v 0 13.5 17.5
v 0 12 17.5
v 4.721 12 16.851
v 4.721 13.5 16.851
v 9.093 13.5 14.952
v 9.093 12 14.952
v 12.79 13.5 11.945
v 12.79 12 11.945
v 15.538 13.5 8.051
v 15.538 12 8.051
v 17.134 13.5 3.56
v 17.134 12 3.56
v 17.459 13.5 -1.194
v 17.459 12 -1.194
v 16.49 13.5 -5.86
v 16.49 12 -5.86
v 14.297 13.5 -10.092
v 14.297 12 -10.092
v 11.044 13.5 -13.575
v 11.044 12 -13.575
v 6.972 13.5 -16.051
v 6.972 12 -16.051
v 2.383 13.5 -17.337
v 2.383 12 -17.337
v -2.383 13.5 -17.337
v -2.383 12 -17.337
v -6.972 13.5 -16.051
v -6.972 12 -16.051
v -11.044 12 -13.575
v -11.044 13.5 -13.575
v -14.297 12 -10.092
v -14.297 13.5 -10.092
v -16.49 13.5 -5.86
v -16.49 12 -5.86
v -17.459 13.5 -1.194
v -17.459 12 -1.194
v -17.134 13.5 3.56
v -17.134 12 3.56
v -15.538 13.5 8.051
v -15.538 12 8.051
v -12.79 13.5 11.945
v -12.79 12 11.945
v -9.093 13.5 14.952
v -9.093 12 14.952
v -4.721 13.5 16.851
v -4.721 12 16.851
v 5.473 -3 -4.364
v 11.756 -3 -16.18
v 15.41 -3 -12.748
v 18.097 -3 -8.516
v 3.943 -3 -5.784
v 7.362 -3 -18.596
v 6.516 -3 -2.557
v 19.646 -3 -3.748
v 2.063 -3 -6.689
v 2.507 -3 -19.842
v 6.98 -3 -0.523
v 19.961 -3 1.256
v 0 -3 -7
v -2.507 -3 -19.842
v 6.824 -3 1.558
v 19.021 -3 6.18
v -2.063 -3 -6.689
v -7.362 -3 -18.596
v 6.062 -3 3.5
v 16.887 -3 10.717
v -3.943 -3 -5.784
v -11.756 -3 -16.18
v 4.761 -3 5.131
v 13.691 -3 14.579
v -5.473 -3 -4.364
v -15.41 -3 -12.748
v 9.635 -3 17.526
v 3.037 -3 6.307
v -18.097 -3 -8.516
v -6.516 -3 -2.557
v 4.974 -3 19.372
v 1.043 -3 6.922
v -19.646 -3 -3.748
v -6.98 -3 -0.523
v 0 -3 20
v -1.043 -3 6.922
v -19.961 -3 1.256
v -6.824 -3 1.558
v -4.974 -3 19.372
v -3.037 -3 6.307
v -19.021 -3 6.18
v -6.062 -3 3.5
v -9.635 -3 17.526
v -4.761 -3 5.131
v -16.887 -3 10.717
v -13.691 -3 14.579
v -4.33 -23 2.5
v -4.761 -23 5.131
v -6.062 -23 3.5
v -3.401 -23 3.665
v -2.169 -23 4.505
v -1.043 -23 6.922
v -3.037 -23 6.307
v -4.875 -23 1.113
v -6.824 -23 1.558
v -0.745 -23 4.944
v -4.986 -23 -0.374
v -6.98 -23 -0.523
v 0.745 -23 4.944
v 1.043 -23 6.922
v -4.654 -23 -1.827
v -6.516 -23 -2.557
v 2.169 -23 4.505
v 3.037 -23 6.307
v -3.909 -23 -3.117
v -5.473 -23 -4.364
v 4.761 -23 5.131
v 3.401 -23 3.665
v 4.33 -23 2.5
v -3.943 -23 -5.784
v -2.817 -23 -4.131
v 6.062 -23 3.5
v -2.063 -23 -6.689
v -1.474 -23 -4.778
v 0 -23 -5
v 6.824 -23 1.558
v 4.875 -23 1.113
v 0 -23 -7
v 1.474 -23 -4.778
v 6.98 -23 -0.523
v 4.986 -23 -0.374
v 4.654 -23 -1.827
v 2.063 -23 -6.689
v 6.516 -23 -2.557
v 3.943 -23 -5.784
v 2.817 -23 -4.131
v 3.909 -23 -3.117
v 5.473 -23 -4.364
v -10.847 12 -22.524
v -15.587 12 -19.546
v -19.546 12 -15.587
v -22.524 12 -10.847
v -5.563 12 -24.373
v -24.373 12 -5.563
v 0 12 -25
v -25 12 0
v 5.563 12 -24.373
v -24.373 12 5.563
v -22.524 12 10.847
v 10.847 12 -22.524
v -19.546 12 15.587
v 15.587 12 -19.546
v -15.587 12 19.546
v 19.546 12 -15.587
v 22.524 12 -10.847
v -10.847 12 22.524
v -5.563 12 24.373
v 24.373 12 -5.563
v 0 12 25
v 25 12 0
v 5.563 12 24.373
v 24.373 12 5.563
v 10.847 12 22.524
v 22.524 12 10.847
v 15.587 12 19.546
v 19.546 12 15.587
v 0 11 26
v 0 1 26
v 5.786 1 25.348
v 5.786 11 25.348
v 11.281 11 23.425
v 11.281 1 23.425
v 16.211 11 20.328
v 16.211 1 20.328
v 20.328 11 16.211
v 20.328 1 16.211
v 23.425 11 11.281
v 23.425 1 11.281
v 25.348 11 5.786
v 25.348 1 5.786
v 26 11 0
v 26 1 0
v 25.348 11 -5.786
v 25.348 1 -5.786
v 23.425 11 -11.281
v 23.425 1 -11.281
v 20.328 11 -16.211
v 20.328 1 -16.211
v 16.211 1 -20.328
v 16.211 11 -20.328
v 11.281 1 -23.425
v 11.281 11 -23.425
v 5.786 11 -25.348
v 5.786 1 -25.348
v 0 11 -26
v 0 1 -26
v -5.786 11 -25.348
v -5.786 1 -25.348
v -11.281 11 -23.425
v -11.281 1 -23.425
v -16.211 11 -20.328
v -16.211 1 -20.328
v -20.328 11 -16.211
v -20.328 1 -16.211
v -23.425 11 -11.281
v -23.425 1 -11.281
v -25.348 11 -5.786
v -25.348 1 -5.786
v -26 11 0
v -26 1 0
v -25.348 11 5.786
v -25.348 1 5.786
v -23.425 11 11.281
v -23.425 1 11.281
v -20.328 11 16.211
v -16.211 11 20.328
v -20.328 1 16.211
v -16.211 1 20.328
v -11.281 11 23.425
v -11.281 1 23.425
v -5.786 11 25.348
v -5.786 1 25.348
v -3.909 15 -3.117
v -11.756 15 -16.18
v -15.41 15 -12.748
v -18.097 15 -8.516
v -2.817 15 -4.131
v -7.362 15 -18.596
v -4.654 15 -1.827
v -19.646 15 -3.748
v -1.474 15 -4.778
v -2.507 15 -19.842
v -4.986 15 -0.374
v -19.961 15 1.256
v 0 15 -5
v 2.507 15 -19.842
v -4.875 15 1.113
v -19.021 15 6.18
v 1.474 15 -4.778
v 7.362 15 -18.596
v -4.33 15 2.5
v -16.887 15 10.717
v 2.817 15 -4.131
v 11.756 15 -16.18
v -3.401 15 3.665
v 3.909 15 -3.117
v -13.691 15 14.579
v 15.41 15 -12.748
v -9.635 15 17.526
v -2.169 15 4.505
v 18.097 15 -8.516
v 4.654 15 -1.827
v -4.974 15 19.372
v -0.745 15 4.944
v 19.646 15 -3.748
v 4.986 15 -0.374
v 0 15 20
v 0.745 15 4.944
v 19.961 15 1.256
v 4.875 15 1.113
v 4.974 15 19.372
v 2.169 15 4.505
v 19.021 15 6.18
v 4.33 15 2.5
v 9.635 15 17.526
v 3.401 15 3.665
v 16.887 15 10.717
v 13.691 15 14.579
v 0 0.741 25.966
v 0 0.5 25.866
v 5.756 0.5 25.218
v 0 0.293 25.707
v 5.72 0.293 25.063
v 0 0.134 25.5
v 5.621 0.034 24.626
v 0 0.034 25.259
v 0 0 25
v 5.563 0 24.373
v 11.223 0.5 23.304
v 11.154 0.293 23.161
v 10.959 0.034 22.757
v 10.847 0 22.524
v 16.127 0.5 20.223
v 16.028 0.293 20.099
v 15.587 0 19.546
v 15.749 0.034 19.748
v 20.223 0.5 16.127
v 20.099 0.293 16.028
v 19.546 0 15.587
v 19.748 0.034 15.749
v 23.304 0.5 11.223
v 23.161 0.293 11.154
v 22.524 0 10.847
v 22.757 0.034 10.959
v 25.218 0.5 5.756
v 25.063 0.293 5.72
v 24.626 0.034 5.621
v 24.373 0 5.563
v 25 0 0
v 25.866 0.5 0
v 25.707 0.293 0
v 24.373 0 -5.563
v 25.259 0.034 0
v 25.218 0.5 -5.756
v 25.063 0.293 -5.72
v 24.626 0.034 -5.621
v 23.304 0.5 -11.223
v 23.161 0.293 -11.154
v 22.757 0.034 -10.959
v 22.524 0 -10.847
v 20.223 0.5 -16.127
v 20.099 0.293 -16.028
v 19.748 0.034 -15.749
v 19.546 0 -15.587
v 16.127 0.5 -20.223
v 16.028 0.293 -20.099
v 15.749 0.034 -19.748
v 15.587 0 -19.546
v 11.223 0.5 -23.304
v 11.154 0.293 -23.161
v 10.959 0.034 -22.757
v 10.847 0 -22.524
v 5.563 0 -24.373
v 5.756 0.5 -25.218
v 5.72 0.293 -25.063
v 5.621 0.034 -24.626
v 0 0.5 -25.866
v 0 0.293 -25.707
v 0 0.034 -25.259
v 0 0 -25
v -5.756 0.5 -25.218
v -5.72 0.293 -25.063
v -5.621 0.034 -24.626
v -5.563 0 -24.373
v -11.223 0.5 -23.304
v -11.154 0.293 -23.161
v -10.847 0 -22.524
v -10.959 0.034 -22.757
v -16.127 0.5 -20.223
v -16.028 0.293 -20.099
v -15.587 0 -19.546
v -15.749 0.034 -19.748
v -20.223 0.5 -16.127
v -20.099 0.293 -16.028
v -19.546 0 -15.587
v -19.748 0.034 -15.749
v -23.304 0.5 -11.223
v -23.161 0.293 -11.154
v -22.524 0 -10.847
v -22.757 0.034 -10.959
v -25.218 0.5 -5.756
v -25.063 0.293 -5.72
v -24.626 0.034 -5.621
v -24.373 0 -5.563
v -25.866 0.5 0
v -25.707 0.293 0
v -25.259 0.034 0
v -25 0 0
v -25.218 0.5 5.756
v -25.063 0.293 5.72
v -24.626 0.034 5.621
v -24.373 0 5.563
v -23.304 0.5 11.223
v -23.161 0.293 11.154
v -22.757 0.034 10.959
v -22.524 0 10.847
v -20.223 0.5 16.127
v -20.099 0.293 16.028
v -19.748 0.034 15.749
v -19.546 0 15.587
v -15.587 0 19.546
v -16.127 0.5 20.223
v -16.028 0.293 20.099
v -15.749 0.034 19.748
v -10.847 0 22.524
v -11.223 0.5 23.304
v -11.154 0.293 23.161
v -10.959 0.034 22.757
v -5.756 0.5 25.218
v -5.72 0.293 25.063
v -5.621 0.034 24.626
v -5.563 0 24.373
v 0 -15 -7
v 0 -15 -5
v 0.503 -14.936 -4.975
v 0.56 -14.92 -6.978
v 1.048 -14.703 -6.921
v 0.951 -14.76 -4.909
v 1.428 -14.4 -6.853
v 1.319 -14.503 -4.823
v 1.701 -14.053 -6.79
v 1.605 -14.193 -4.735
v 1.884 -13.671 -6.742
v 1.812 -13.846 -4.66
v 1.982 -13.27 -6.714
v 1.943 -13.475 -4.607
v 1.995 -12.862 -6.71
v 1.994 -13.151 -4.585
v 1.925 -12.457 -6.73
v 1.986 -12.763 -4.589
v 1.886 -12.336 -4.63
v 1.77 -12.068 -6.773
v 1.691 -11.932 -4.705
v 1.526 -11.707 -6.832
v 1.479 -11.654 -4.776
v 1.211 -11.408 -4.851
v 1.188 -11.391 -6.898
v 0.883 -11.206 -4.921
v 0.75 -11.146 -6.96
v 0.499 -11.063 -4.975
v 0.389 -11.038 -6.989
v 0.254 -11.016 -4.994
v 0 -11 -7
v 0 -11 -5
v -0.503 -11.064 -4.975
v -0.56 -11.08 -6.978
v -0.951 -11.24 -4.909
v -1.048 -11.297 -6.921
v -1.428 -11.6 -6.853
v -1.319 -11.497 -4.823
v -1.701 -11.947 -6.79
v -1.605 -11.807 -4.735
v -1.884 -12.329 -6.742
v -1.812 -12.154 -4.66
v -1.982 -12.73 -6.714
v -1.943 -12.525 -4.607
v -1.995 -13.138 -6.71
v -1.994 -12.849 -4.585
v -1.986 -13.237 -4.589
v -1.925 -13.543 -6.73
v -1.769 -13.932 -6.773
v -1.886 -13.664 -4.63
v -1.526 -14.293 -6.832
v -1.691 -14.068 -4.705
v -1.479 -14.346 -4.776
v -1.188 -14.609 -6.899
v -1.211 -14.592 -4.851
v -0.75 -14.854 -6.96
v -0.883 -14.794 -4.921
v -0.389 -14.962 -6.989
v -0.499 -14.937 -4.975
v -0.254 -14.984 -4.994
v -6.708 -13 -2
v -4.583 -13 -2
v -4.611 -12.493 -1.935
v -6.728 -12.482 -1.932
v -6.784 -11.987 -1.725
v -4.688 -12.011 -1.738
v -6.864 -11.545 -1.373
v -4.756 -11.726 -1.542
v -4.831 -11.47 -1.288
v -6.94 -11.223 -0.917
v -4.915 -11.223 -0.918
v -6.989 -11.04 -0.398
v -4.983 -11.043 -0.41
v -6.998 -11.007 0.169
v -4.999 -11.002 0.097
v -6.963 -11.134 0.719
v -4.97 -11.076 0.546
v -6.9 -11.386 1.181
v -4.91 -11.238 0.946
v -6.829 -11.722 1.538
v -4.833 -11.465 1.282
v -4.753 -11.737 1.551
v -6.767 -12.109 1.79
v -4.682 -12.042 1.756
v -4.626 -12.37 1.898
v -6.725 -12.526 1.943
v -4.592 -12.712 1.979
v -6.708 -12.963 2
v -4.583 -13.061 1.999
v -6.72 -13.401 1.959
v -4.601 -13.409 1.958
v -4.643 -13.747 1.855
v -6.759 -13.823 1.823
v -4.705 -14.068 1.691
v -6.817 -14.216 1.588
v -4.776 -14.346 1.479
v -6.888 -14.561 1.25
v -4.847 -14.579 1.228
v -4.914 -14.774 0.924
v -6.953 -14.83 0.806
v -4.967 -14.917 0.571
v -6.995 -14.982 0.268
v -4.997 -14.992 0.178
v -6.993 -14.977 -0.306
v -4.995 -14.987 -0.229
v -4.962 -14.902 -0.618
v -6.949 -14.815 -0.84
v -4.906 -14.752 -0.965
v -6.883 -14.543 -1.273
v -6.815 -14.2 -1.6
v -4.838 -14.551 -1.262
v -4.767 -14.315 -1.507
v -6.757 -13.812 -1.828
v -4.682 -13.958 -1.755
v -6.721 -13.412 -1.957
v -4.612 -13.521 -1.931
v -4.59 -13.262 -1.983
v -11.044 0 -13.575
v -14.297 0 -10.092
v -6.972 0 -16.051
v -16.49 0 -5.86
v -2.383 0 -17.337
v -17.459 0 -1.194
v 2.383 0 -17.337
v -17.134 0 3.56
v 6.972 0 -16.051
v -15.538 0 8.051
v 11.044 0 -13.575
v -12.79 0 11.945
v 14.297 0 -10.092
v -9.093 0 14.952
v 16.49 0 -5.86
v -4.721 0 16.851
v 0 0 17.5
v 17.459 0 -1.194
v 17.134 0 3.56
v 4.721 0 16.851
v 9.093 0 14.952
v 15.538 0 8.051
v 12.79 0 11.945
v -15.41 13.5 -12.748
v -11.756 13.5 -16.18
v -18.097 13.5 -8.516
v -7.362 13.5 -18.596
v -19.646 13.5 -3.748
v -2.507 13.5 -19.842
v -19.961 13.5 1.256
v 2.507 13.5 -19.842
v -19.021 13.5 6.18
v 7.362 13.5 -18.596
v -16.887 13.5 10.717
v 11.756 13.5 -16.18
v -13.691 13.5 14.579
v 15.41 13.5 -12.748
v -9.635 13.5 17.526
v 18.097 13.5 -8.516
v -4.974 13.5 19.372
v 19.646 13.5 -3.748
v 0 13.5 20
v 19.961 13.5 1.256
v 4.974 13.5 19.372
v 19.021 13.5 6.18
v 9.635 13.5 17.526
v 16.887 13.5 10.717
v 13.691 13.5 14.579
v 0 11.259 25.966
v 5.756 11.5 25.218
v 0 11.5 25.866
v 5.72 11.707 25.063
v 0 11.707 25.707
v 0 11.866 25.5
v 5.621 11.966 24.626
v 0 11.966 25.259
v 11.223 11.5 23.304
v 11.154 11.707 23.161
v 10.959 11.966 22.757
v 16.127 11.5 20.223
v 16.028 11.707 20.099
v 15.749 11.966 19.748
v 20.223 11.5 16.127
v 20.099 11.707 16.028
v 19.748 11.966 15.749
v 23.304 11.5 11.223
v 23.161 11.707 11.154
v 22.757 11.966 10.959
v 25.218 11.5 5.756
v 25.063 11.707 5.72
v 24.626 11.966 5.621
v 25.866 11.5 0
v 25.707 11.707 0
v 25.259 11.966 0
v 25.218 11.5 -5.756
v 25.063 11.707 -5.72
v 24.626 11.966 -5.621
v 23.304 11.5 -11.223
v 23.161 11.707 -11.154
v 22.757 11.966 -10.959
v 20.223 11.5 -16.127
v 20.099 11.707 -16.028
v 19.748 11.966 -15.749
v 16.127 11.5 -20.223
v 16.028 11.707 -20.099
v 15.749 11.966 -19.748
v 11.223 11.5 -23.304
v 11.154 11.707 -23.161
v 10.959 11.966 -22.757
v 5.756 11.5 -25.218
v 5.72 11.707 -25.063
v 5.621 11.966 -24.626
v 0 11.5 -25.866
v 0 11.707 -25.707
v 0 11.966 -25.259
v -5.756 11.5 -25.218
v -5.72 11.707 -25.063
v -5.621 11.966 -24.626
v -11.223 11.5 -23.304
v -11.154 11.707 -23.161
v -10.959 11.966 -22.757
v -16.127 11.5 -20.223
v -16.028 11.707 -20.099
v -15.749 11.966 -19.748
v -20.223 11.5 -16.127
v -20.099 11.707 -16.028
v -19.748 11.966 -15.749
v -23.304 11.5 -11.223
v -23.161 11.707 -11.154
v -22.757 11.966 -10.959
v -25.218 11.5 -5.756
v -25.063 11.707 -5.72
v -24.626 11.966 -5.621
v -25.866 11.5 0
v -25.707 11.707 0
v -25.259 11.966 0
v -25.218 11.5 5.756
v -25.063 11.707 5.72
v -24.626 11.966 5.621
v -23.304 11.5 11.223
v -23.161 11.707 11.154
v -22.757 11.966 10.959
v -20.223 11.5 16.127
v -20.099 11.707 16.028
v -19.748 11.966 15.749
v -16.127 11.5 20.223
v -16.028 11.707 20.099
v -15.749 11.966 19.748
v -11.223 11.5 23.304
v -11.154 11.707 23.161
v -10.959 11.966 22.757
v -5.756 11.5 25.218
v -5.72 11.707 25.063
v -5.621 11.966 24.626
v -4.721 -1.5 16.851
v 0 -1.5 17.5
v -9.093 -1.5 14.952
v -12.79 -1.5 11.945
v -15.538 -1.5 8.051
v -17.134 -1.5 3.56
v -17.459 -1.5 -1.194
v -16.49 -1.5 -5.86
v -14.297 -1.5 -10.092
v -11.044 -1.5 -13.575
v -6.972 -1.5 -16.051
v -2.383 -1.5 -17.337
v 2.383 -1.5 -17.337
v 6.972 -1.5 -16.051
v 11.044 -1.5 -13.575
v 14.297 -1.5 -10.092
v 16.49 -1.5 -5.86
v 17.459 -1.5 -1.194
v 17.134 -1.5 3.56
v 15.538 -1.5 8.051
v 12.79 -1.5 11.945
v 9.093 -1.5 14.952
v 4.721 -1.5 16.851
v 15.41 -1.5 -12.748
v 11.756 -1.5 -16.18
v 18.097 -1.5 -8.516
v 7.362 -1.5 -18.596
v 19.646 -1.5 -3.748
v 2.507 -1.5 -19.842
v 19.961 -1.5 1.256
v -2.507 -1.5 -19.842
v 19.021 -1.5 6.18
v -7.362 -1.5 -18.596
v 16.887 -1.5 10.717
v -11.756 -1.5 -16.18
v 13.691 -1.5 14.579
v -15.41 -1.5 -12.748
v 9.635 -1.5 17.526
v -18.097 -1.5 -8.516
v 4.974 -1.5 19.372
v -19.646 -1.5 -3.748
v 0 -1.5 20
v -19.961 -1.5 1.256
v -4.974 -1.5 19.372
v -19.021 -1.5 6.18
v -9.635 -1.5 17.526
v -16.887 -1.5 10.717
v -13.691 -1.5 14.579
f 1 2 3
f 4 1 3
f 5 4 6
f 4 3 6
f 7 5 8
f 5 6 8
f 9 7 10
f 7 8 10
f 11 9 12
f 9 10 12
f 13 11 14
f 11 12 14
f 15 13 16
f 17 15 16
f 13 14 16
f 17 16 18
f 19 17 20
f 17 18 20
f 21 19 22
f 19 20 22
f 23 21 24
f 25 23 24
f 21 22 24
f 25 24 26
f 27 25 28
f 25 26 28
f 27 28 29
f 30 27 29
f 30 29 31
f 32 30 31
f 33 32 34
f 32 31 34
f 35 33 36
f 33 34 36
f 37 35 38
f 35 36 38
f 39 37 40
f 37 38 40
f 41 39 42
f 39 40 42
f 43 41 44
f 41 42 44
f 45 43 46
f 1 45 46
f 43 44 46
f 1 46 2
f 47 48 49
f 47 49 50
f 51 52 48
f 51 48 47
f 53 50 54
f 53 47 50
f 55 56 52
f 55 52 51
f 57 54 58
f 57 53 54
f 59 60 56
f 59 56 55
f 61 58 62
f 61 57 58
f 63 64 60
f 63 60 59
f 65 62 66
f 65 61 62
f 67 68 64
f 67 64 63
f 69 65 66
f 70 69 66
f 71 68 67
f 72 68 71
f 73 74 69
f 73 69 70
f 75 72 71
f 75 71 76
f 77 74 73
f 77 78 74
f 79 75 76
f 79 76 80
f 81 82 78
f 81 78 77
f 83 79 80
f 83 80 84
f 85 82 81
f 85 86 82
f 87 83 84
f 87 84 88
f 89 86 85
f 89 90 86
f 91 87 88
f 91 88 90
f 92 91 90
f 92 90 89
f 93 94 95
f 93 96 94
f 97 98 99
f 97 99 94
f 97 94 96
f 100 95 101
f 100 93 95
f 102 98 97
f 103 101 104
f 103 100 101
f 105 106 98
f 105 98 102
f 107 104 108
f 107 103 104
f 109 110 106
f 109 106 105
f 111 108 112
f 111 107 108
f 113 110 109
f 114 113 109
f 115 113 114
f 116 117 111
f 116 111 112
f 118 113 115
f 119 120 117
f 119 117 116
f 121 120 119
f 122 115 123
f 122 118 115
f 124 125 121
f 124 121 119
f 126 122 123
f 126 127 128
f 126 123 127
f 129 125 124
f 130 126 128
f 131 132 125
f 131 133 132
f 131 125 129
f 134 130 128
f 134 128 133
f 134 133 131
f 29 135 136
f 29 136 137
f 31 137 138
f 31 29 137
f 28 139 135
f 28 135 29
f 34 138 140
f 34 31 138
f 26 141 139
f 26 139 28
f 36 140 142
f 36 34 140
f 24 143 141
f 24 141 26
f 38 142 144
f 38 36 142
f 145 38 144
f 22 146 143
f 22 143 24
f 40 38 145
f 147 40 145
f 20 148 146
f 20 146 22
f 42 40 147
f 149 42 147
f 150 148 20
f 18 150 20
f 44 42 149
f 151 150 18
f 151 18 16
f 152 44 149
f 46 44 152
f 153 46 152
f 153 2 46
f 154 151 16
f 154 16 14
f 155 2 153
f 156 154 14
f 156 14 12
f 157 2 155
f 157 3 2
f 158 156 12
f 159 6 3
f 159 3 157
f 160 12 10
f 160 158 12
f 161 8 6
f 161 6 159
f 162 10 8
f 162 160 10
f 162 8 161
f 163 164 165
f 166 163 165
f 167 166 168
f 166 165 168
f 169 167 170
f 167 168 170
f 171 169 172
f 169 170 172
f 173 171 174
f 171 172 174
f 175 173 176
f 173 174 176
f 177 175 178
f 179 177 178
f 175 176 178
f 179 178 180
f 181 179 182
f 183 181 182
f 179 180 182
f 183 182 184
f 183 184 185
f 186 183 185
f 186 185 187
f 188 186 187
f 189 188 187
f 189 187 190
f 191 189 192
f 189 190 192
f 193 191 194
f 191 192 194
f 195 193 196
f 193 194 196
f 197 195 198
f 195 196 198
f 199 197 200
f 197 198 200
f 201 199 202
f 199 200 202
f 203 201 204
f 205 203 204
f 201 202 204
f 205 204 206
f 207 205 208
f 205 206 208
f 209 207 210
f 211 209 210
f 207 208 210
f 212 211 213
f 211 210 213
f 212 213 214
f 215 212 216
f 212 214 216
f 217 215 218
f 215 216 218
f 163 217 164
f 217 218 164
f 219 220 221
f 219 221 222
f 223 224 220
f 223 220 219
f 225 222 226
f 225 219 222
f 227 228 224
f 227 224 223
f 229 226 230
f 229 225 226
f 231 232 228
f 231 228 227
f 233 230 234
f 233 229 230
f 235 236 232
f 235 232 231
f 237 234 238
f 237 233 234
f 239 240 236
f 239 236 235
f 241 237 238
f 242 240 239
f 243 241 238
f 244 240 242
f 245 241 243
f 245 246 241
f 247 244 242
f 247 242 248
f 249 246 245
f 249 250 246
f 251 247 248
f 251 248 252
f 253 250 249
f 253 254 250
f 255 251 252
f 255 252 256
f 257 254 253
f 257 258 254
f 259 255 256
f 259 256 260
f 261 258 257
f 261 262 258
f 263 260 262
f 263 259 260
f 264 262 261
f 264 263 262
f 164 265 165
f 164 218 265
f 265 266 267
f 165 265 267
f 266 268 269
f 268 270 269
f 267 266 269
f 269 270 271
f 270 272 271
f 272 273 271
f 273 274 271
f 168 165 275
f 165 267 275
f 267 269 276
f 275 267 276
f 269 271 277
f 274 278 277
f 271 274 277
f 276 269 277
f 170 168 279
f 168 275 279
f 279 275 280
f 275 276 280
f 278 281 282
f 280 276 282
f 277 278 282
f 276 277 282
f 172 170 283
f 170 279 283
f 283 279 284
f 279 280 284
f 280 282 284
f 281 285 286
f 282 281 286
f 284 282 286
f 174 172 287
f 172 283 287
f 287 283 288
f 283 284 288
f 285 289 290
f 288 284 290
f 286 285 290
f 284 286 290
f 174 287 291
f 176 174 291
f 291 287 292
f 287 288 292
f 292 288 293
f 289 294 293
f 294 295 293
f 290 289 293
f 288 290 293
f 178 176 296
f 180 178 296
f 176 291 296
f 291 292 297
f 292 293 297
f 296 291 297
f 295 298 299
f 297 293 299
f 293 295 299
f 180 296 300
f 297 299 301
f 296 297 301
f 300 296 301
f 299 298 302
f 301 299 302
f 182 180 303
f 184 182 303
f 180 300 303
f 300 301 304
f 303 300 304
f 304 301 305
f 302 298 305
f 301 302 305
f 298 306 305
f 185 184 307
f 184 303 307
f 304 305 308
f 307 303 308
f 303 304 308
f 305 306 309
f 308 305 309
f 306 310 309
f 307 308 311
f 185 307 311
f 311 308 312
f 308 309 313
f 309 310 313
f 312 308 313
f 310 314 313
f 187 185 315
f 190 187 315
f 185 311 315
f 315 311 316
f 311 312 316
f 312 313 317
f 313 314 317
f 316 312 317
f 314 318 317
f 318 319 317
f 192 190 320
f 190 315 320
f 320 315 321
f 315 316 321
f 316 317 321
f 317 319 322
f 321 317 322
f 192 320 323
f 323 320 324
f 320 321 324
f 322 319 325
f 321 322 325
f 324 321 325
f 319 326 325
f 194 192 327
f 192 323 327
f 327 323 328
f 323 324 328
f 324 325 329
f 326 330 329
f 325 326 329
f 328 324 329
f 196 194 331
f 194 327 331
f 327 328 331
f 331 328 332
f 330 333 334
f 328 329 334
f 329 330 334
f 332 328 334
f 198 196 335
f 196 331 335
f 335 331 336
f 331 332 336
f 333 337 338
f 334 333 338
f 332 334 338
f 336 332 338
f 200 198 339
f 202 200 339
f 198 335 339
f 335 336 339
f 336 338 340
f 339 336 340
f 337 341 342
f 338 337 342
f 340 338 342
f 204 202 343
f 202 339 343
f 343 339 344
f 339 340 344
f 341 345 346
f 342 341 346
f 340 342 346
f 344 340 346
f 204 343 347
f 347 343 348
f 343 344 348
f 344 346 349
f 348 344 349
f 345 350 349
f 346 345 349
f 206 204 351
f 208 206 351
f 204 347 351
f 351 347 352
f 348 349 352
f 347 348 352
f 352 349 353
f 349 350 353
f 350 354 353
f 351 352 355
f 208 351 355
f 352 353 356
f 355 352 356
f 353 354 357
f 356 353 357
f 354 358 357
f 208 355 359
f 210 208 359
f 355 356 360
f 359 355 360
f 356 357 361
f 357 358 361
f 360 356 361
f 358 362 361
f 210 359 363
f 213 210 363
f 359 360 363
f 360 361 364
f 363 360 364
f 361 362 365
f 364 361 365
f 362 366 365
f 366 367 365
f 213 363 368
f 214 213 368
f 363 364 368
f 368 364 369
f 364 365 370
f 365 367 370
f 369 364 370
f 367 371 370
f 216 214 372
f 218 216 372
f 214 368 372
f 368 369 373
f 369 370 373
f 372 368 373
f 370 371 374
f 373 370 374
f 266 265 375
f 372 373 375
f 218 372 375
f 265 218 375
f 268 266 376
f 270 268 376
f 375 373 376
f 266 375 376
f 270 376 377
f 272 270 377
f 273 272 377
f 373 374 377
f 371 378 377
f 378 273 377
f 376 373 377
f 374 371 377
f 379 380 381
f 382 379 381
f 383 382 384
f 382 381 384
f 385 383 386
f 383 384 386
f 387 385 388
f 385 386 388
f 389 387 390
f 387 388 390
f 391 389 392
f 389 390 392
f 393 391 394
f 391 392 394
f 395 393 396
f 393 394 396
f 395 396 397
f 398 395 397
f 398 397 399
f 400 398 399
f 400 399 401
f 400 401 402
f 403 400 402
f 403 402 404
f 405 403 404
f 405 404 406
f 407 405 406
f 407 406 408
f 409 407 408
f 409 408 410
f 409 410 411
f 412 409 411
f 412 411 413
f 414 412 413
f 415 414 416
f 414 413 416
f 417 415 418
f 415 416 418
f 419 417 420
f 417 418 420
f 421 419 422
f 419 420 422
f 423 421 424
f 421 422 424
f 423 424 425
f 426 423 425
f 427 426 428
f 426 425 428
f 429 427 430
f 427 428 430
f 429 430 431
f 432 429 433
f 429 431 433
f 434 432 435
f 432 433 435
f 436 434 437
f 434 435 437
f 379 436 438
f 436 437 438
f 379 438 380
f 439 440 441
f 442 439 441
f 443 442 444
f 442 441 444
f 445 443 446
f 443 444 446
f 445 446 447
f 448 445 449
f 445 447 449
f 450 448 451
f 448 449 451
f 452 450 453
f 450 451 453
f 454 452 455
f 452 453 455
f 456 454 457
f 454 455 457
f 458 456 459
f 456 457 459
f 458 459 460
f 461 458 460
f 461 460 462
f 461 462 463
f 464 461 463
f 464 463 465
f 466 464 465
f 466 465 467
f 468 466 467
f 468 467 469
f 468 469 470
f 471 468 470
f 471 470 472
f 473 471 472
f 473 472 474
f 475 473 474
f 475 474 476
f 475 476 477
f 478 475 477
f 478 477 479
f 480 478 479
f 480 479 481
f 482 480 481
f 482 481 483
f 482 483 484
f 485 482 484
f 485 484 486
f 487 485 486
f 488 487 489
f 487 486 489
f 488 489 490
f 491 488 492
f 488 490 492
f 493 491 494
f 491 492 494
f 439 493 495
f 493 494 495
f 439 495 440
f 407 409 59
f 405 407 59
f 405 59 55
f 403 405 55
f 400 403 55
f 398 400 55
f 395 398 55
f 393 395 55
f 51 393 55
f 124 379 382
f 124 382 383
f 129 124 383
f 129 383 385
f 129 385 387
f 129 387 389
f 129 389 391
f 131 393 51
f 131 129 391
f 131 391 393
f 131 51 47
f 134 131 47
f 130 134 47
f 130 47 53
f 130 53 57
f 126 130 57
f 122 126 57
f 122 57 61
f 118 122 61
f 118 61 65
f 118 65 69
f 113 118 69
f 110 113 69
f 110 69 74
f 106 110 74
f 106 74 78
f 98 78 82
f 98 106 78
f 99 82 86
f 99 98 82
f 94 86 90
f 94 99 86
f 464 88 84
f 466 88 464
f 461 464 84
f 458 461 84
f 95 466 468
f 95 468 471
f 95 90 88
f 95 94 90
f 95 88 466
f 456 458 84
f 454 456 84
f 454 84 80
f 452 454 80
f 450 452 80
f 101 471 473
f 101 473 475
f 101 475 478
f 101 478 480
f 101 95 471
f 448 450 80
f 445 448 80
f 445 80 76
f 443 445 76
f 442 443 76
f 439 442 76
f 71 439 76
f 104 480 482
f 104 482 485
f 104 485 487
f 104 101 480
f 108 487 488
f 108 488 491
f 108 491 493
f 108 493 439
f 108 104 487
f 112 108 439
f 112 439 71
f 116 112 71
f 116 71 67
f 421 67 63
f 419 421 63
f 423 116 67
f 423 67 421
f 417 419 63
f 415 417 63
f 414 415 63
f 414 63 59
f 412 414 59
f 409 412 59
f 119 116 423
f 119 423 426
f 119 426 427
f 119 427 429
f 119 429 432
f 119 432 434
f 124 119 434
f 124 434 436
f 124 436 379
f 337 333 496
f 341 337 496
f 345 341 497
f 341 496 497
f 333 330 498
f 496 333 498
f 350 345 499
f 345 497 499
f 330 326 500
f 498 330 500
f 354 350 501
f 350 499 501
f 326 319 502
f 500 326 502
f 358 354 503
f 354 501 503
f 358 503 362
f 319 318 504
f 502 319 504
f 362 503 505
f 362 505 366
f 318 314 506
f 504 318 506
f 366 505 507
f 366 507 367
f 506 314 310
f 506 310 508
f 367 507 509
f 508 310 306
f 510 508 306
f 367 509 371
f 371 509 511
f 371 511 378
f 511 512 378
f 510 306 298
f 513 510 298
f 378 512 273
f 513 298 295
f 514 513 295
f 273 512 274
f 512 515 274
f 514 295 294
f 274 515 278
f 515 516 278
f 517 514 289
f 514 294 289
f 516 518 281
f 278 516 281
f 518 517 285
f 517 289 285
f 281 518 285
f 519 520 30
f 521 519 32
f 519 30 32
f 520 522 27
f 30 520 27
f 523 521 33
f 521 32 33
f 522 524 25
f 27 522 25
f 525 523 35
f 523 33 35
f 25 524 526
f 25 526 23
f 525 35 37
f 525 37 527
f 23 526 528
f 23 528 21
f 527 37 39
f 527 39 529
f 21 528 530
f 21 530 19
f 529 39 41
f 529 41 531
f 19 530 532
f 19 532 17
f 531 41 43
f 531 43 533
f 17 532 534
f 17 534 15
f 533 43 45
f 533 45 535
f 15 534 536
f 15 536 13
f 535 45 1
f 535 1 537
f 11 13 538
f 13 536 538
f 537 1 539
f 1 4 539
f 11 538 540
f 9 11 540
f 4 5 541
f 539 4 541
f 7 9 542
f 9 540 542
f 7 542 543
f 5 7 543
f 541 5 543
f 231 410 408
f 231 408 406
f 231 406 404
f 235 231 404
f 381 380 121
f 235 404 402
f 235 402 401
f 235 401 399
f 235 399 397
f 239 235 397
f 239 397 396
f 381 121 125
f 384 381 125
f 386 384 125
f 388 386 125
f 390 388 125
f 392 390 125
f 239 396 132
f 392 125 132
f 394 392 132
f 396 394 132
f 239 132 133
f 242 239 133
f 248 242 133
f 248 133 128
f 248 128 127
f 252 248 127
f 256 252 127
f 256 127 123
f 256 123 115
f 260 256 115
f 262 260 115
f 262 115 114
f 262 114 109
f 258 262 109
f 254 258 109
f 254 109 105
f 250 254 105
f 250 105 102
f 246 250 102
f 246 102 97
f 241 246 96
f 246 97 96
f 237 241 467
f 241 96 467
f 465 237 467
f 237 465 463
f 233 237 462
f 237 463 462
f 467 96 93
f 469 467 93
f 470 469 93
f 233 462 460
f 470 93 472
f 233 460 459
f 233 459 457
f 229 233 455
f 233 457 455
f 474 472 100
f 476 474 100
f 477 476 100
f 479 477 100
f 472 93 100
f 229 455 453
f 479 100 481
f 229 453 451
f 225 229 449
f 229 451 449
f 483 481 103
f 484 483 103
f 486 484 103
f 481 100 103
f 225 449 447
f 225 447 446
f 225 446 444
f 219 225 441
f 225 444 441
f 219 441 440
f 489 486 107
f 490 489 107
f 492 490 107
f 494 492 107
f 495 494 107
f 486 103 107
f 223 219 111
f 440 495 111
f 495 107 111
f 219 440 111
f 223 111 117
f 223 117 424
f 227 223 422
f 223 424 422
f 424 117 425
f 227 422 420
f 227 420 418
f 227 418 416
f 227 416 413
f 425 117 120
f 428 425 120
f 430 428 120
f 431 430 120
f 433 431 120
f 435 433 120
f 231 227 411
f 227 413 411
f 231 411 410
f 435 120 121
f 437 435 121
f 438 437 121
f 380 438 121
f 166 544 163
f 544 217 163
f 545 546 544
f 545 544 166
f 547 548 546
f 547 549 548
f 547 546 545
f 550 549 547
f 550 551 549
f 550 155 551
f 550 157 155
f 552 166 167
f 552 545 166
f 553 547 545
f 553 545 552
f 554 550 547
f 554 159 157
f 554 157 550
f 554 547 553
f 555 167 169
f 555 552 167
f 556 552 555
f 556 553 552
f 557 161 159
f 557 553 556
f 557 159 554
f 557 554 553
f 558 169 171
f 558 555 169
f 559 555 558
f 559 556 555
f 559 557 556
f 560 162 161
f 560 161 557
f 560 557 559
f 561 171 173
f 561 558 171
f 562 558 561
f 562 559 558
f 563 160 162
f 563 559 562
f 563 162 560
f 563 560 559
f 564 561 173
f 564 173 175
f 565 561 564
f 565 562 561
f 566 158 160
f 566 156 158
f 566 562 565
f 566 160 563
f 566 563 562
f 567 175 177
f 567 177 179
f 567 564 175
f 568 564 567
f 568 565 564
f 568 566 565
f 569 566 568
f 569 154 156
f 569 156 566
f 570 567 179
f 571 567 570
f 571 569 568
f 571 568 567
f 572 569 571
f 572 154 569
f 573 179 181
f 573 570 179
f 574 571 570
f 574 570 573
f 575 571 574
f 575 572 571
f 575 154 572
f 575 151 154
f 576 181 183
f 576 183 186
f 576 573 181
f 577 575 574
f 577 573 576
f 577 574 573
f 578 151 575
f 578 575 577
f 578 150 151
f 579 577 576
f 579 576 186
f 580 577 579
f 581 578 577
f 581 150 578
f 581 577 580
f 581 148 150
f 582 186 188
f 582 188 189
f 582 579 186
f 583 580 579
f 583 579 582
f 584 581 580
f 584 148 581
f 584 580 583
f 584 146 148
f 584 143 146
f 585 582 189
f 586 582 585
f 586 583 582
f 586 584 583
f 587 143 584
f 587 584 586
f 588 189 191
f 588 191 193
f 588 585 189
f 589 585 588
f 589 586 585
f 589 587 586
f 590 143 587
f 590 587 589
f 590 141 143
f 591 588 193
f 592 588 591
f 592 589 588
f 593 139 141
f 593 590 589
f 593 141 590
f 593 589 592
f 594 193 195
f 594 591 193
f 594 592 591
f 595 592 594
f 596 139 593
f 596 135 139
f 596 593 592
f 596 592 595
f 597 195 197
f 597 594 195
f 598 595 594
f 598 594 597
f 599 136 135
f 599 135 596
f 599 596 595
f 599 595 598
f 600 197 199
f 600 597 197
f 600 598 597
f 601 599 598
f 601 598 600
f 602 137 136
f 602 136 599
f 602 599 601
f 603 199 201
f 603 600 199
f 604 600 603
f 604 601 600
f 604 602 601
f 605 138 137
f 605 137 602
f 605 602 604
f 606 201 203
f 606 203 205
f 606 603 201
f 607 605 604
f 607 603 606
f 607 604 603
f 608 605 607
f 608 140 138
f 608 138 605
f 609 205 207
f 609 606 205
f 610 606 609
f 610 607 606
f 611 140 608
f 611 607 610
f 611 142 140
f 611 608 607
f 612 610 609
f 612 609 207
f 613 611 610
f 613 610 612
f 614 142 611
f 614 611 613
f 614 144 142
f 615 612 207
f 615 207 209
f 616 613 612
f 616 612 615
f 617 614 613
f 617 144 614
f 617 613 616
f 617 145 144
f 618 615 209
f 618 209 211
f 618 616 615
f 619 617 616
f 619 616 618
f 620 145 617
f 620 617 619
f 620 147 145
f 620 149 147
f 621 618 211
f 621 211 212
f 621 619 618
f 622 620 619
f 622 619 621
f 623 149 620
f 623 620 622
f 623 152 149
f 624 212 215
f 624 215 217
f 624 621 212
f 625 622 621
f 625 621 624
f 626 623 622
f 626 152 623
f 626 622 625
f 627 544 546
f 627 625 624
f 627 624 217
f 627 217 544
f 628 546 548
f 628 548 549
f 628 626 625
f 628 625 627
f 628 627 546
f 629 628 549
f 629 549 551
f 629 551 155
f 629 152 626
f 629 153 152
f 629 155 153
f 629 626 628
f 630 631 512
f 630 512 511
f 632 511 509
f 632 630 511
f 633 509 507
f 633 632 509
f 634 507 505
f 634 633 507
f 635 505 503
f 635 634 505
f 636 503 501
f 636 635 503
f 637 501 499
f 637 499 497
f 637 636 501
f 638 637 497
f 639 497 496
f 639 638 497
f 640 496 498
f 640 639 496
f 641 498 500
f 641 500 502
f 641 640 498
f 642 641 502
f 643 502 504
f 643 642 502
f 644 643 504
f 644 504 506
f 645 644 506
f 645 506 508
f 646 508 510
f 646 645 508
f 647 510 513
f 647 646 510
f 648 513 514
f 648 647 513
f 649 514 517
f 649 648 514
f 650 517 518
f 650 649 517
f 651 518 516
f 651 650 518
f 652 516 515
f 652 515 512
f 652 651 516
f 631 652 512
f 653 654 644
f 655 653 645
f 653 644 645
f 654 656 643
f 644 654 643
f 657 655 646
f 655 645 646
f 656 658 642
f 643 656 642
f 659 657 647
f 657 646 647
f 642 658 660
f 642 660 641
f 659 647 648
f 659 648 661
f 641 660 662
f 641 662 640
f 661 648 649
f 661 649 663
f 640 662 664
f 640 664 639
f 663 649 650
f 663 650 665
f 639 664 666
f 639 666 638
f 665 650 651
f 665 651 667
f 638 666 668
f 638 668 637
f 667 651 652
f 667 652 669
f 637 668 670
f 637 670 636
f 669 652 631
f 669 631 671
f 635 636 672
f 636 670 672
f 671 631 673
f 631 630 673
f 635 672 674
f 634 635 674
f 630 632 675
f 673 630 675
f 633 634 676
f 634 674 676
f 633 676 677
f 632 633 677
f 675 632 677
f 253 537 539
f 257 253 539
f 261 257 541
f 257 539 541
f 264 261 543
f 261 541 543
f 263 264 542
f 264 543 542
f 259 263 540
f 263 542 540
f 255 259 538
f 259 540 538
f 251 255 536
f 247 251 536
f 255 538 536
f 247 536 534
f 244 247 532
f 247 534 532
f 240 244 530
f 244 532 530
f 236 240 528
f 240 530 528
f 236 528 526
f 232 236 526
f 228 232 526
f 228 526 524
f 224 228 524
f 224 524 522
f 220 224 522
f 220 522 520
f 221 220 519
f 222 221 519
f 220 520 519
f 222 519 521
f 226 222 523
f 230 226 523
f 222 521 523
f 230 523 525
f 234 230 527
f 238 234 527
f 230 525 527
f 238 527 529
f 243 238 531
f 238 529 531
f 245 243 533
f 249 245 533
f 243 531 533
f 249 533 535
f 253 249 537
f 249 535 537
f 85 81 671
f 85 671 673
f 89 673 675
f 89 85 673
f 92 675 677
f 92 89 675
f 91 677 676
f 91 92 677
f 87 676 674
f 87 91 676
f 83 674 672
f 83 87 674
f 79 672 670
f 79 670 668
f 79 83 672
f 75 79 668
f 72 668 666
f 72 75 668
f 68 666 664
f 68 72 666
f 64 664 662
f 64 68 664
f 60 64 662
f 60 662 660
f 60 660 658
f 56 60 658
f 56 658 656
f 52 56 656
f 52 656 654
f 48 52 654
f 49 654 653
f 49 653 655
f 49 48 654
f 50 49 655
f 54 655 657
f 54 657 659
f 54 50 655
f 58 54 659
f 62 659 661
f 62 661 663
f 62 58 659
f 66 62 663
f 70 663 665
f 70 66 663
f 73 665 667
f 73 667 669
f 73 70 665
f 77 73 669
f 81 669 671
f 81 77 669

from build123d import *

# Parameters (mm, degrees)
SKETCH_1_R          = 26
EXTRUDE_1_DEPTH     = 12
SKETCH_2_R          = 17.5
EXTRUDE_2_DEPTH     = 1.5
EXTRUDE_START       = 1.5
SKETCH_3_R          = 17.5
EXTRUDE_3_DEPTH     = 1.5
SKETCH_4_R          = 20
EXTRUDE_4_DEPTH     = 1.5
SKETCH_5_R          = 20
EXTRUDE_5_DEPTH     = 1.5
SKETCH_6_R          = 5
CUT_EXTRUDE_1_DEPTH = 41.938978981
EXTRUDE_START_2     = 20
SKETCH_7_R          = 7
SKETCH_7_R_2        = 5
EXTRUDE_6_DEPTH     = 20
SKETCH_8_R          = 2
CUT_EXTRUDE_2_DEPTH = 44.370496884
SKETCH_9_R          = 2
CUT_EXTRUDE_3_DEPTH = 44.370496937
FILLET_1_R          = 1
FILLET_2_R          = 1


with BuildPart() as part:
    # 草图1 → 凸台-拉伸1 (new body)
    with BuildSketch(Plane(origin=(0, 0, 0), x_dir=(1, 0, 0), z_dir=(0, 1, 0))):
        with Locations(Location((0, 0, 0), (0, 0, 270))):
            Circle(SKETCH_1_R)
    extrude(amount=EXTRUDE_1_DEPTH)

    # 草图2 → 凸台-拉伸2 (add)
    with BuildSketch(Plane(origin=(0, 12, 0), x_dir=(1, 0, 0), z_dir=(0, 1, 0))):
        with Locations(Location((0, 0, 0), (0, 0, 270))):
            Circle(SKETCH_2_R)
    extrude(amount=EXTRUDE_2_DEPTH)

    # 草图3 → 凸台-拉伸3 (add)
    with BuildSketch(Plane.XZ.offset(EXTRUDE_START)):
        with Locations(Location((0, 0, 0), (0, 0, 90))):
            Circle(SKETCH_3_R)
    extrude(amount=-EXTRUDE_3_DEPTH)

    # 草图4 → 凸台-拉伸4 (add)
    with BuildSketch(Plane(origin=(0, 13.5, 0), x_dir=(1, 0, 0), z_dir=(0, 1, 0))):
        with Locations(Location((0, 0, 0), (0, 0, 270))):
            Circle(SKETCH_4_R)
    extrude(amount=EXTRUDE_4_DEPTH)

    # 草图5 → 凸台-拉伸5 (add)
    with BuildSketch(Plane.XZ.offset(1.5).offset(EXTRUDE_START)):
        with Locations(Location((0, 0, 0), (0, 0, 90))):
            Circle(SKETCH_5_R)
    extrude(amount=-EXTRUDE_5_DEPTH)

    # 草图6 → 切除-拉伸1 (cut, through all)
    with BuildSketch(Plane.XZ.offset(3)):
        with Locations(Location((0, 0, 0), (0, 0, 270))):
            Circle(SKETCH_6_R)
    extrude(amount=-CUT_EXTRUDE_1_DEPTH, mode=Mode.SUBTRACT)

    # 草图7 → 凸台-拉伸6 (add)
    with BuildSketch(Plane.XZ.offset(3).offset(EXTRUDE_START_2)):
        with Locations(Location((0, 0, 0), (0, 0, 270))):
            Circle(SKETCH_7_R)
        with Locations(Location((0, 0, 0), (0, 0, 270))):
            Circle(SKETCH_7_R_2, mode=Mode.SUBTRACT)
    extrude(amount=-EXTRUDE_6_DEPTH)

    # 草图8 → 切除-拉伸2 (cut, through all)
    with BuildSketch(Plane(origin=(0, 0, 0), x_dir=(0, 0, -1), z_dir=(1, 0, 0))):
        with Locations((0, -13)):
            Circle(SKETCH_8_R)
    extrude(amount=-CUT_EXTRUDE_2_DEPTH, mode=Mode.SUBTRACT)

    # 草图9 → 切除-拉伸3 (cut, through all)
    with BuildSketch(Plane.XY):
        with Locations(Location((0, -13, 0), (0, 0, 270.00000003))):
            Circle(SKETCH_9_R)
    extrude(amount=-CUT_EXTRUDE_3_DEPTH, mode=Mode.SUBTRACT)

    # 圆角1
    fillet_1_edges = [part.edges().sort_by_distance(p)[0] for p in [
        (0, 12, -26),
    ]]
    fillet(fillet_1_edges, radius=FILLET_1_R)

    # 圆角2
    fillet_2_edges = [part.edges().sort_by_distance(p)[0] for p in [
        (0, 0, -26),
    ]]
    fillet(fillet_2_edges, radius=FILLET_2_R)


solid = part.part
